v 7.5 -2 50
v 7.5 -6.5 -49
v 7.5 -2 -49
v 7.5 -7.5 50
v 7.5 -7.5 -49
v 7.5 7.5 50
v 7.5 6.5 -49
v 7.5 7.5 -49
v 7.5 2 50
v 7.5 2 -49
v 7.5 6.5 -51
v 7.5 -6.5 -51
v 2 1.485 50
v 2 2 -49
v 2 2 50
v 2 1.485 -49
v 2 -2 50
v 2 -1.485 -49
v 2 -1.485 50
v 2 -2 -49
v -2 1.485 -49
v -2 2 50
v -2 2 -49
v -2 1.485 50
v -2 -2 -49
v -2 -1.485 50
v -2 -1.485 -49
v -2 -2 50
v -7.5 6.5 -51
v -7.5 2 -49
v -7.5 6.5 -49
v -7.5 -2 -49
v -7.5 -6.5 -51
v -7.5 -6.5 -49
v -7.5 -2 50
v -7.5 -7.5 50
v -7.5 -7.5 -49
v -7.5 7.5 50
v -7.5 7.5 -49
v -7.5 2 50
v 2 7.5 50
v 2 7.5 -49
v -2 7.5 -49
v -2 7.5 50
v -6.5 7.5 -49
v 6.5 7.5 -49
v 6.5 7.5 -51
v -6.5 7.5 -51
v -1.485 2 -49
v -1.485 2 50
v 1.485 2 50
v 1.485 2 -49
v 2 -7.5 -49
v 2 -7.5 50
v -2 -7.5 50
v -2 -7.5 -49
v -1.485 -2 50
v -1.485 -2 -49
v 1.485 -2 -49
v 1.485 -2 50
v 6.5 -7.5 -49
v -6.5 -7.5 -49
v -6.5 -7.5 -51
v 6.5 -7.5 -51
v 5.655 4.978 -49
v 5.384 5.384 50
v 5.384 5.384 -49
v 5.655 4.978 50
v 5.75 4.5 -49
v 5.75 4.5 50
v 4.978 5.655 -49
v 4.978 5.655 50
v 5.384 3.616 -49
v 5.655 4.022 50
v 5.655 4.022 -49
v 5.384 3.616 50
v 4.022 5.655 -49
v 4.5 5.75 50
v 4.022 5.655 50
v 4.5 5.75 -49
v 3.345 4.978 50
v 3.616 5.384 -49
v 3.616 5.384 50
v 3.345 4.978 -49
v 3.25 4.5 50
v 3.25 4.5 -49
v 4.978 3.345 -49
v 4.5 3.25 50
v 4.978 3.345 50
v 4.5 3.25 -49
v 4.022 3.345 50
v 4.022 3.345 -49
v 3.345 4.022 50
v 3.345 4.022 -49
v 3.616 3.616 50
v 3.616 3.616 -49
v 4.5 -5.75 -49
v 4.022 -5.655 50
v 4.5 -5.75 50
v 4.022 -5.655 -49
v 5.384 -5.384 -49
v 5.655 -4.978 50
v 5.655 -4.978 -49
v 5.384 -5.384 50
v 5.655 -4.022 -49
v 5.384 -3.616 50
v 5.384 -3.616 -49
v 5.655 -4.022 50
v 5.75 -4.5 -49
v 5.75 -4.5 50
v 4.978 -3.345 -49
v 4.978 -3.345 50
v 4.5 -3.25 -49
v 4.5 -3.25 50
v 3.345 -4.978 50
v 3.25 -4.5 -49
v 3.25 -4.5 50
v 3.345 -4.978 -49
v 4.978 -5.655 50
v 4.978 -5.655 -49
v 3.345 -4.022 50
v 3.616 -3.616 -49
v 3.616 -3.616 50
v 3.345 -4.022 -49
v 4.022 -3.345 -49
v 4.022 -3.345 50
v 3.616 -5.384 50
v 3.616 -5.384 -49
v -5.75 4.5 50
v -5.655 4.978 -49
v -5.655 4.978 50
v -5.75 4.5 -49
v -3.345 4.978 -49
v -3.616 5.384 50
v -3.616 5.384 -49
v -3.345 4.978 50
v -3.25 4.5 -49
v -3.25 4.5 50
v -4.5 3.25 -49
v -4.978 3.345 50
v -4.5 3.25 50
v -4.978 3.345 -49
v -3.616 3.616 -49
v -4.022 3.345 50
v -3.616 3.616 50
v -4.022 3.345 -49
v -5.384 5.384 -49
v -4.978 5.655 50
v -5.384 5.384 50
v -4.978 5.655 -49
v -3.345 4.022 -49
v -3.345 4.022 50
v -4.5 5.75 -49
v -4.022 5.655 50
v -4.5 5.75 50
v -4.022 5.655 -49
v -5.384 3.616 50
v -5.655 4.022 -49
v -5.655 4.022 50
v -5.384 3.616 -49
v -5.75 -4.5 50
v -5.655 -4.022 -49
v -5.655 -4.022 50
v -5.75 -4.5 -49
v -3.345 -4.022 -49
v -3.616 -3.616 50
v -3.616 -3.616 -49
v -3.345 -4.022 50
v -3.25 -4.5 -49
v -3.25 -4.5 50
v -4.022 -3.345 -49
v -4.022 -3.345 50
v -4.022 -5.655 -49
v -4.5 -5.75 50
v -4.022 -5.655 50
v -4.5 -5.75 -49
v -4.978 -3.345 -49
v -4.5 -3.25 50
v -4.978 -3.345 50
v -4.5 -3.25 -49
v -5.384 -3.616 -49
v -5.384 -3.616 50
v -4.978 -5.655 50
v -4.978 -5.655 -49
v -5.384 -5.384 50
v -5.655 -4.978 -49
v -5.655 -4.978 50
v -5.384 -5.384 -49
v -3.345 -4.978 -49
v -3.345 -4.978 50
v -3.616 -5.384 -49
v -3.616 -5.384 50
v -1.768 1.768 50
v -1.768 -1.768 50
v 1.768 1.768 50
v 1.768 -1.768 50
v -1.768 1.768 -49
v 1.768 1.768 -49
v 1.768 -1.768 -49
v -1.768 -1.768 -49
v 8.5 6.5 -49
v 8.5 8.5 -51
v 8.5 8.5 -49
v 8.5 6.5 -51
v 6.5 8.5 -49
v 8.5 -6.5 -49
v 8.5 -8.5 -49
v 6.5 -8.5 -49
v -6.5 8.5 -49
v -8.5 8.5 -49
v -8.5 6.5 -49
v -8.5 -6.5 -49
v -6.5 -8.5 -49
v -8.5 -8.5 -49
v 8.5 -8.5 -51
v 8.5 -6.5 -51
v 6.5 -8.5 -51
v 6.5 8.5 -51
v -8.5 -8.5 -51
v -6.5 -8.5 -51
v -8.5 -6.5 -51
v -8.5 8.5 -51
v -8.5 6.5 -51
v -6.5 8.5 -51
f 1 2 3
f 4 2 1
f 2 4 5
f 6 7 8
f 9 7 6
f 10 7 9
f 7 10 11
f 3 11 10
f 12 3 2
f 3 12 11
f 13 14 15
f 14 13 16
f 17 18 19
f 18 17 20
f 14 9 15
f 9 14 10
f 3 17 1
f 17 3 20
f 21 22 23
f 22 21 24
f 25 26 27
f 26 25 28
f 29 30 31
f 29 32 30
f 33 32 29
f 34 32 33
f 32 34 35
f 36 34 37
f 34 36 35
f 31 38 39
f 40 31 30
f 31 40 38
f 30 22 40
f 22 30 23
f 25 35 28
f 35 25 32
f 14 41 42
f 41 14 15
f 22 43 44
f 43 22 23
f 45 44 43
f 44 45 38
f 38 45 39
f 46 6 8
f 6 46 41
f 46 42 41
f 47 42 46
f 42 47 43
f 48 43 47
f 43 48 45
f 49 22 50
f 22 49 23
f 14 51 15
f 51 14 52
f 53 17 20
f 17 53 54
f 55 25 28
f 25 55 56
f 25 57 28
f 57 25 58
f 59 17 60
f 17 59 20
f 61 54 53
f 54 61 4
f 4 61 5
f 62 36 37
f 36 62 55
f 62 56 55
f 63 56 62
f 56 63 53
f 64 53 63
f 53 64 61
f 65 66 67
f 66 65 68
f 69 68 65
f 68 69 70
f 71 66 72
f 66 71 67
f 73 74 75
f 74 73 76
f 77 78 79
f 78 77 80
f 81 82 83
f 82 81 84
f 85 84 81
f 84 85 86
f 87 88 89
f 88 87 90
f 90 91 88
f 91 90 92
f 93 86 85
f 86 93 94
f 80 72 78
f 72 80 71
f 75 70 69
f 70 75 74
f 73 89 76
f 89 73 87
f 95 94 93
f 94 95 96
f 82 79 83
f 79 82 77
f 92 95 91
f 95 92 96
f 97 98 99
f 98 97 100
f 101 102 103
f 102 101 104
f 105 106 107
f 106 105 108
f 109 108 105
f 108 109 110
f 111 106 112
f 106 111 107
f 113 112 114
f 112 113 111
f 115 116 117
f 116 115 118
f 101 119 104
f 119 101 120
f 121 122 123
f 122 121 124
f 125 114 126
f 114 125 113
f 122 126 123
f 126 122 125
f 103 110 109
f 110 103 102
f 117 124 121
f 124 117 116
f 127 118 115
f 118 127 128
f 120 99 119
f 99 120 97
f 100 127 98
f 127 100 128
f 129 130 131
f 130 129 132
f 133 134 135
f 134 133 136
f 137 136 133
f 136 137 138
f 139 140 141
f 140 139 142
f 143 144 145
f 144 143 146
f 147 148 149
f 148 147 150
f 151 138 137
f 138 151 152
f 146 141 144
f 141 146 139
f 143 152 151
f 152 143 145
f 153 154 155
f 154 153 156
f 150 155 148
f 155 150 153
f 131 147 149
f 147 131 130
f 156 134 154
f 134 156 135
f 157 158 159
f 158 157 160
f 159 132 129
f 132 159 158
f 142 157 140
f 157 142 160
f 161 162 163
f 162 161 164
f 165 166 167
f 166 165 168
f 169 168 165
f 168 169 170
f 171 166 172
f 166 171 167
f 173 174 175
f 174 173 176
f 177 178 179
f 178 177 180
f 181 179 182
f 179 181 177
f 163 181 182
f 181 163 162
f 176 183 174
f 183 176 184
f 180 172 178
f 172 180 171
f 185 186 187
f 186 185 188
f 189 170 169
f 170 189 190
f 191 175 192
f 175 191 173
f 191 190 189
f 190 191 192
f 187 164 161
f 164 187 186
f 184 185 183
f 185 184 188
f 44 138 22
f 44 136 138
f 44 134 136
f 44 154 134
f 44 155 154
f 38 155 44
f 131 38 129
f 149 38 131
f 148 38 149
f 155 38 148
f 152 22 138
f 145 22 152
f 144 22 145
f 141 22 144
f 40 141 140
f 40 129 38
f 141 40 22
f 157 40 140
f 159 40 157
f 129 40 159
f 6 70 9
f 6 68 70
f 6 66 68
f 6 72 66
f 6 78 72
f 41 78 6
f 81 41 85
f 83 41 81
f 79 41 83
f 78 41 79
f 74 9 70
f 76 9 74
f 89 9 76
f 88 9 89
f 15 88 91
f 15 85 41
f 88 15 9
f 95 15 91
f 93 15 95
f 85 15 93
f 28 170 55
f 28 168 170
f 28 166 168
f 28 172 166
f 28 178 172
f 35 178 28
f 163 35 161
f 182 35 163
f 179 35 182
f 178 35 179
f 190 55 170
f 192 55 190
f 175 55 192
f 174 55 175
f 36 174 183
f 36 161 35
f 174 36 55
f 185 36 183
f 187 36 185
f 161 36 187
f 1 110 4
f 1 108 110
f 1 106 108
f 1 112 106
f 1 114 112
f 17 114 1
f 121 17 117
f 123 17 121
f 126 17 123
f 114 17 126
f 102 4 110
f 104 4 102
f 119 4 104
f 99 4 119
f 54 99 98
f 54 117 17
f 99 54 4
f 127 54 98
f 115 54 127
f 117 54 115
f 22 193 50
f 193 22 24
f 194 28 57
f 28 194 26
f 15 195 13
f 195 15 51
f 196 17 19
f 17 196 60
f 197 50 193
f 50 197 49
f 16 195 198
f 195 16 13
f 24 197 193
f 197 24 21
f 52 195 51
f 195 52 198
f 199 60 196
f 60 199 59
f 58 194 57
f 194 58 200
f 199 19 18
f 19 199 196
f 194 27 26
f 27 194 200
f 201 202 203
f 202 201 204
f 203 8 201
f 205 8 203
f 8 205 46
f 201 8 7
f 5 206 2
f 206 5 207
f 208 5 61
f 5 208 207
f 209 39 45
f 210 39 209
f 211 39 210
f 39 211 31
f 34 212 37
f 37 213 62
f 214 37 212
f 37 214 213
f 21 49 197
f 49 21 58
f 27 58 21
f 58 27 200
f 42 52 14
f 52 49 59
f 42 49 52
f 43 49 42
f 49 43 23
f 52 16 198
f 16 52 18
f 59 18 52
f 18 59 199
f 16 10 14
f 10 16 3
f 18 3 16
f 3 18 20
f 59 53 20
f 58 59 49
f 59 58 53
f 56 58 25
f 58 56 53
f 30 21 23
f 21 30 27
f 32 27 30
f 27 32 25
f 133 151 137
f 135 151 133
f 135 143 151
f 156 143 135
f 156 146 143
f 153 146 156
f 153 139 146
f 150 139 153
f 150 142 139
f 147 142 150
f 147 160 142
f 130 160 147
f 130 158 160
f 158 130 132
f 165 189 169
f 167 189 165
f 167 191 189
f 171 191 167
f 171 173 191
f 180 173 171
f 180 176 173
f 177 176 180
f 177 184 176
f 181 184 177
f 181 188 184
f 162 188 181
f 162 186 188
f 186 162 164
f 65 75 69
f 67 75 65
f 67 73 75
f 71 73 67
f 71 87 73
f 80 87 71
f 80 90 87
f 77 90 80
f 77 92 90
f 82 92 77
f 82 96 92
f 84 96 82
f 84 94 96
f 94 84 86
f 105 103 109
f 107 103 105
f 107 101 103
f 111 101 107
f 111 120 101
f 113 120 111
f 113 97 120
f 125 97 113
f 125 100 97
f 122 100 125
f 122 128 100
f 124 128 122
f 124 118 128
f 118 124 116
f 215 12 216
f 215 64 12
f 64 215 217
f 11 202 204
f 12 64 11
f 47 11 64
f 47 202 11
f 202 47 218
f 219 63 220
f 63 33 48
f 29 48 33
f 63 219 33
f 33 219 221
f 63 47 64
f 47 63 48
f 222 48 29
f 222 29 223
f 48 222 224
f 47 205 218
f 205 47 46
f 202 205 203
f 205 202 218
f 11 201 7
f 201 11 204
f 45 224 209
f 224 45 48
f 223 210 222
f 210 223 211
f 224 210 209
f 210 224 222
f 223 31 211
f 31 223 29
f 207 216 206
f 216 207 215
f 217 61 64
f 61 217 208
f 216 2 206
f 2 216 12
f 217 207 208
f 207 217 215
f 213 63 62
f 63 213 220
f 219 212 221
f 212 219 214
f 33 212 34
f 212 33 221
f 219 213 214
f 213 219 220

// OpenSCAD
// Parameters
profile_width_mm = 15.0; //[7.5:30.0:0.5]
profile_height_mm = 15.0; //[7.5:30.0:0.5]
length_mm = 100.0; //[50.0:200.0:1]
center = 1; //[0:1:1]
cornerHole = 1; //[0:1:1]
wall_thickness_mm = 2.0; //[1.0:4.0:0.25]
slot_opening_mm = 4.0; //[2.0:7.0:0.25]
slot_depth_mm = 4.5; //[2.0:7.0:0.25]
center_bore_d_mm = 5.0; //[2.0:8.0:0.25]
corner_relief_d_mm = 2.5; //[1.0:5.0:0.25]
corner_relief_inset_mm = 3.0; //[1.5:6.0:0.25]
overlap_mm = 1.0; //[0.5:2.0:0.25]

// Extrusion - complete geometry
module extrusion() {
  color("Silver")
  difference() {
    // Main body
    cube([profile_width_mm, profile_height_mm, length_mm], center=true);

    // Center bore
    cylinder(r=center_bore_d_mm/2, h=length_mm + 2*overlap_mm, center=true, $fn=32);

    // T-slot channels
    union() {
      translate([profile_width_mm/2 - (slot_depth_mm + overlap_mm)/2, 0, 0])
        cube([slot_depth_mm + overlap_mm, slot_opening_mm, length_mm + 2*overlap_mm], center=true);
      translate([-profile_width_mm/2 + (slot_depth_mm + overlap_mm)/2, 0, 0])
        cube([slot_depth_mm + overlap_mm, slot_opening_mm, length_mm + 2*overlap_mm], center=true);
      translate([0, profile_height_mm/2 - (slot_depth_mm + overlap_mm)/2, 0])
        cube([slot_opening_mm, slot_depth_mm + overlap_mm, length_mm + 2*overlap_mm], center=true);
      translate([0, -profile_height_mm/2 + (slot_depth_mm + overlap_mm)/2, 0])
        cube([slot_opening_mm, slot_depth_mm + overlap_mm, length_mm + 2*overlap_mm], center=true);
    }

    // Corner relief holes
    if (cornerHole) {
      union() {
        translate([profile_width_mm/2 - corner_relief_inset_mm, profile_height_mm/2 - corner_relief_inset_mm, 0])
          cylinder(r=corner_relief_d_mm/2, h=length_mm + 2*overlap_mm, center=true, $fn=16);
        translate([profile_width_mm/2 - corner_relief_inset_mm, -profile_height_mm/2 + corner_relief_inset_mm, 0])
          cylinder(r=corner_relief_d_mm/2, h=length_mm + 2*overlap_mm, center=true, $fn=16);
        translate([-profile_width_mm/2 + corner_relief_inset_mm, profile_height_mm/2 - corner_relief_inset_mm, 0])
          cylinder(r=corner_relief_d_mm/2, h=length_mm + 2*overlap_mm, center=true, $fn=16);
        translate([-profile_width_mm/2 + corner_relief_inset_mm, -profile_height_mm/2 + corner_relief_inset_mm, 0])
          cylinder(r=corner_relief_d_mm/2, h=length_mm + 2*overlap_mm, center=true, $fn=16);
      }
    }
  }
}

// Extrusion Cross Section - end-cap slice (must be attached)
module extrusion_cross_section() {
  color("DimGray")
    cube([profile_width_mm, profile_height_mm, wall_thickness_mm], center=true);
}

// Box Corner Profile Section - small corner marker (must be attached)
module box_corner_profile_section() {
  color("Black")
    cube([wall_thickness_mm, wall_thickness_mm, wall_thickness_mm], center=true);
}

// Box Corner Profile Sections - place at the 4 corners of the end-cap slice
module box_corner_profile_sections() {
  // Place at corners of the 15x15 end face, not at (-profile_width_mm, ...)
  // Slightly inset so they overlap the end-cap slice by overlap_mm.
  x = profile_width_mm/2 - wall_thickness_mm/2 + overlap_mm;
  y = profile_height_mm/2 - wall_thickness_mm/2 + overlap_mm;

  union() {
    translate([ x,  y, 0]) box_corner_profile_section();
    translate([-x,  y, 0]) box_corner_profile_section();
    translate([ x, -y, 0]) box_corner_profile_section();
    translate([-x, -y, 0]) box_corner_profile_section();
  }
}

// Assembly - ensure EVERYTHING is one connected solid
module assembly() {
  // Attach the end-cap slice and corner markers to the extrusion end with overlap.
  // Extrusion spans z = [-L/2, +L/2]
  // End-cap slice thickness = wall_thickness_mm, centered at:
  // z = -L/2 + wall_thickness_mm/2 - overlap_mm  (push into extrusion by overlap)
  z_endcap = -length_mm/2 + wall_thickness_mm/2 - overlap_mm;

  union() {
    extrusion();

    translate([0, 0, z_endcap])
      extrusion_cross_section();

    translate([0, 0, z_endcap])
      box_corner_profile_sections();
  }
}

assembly();
